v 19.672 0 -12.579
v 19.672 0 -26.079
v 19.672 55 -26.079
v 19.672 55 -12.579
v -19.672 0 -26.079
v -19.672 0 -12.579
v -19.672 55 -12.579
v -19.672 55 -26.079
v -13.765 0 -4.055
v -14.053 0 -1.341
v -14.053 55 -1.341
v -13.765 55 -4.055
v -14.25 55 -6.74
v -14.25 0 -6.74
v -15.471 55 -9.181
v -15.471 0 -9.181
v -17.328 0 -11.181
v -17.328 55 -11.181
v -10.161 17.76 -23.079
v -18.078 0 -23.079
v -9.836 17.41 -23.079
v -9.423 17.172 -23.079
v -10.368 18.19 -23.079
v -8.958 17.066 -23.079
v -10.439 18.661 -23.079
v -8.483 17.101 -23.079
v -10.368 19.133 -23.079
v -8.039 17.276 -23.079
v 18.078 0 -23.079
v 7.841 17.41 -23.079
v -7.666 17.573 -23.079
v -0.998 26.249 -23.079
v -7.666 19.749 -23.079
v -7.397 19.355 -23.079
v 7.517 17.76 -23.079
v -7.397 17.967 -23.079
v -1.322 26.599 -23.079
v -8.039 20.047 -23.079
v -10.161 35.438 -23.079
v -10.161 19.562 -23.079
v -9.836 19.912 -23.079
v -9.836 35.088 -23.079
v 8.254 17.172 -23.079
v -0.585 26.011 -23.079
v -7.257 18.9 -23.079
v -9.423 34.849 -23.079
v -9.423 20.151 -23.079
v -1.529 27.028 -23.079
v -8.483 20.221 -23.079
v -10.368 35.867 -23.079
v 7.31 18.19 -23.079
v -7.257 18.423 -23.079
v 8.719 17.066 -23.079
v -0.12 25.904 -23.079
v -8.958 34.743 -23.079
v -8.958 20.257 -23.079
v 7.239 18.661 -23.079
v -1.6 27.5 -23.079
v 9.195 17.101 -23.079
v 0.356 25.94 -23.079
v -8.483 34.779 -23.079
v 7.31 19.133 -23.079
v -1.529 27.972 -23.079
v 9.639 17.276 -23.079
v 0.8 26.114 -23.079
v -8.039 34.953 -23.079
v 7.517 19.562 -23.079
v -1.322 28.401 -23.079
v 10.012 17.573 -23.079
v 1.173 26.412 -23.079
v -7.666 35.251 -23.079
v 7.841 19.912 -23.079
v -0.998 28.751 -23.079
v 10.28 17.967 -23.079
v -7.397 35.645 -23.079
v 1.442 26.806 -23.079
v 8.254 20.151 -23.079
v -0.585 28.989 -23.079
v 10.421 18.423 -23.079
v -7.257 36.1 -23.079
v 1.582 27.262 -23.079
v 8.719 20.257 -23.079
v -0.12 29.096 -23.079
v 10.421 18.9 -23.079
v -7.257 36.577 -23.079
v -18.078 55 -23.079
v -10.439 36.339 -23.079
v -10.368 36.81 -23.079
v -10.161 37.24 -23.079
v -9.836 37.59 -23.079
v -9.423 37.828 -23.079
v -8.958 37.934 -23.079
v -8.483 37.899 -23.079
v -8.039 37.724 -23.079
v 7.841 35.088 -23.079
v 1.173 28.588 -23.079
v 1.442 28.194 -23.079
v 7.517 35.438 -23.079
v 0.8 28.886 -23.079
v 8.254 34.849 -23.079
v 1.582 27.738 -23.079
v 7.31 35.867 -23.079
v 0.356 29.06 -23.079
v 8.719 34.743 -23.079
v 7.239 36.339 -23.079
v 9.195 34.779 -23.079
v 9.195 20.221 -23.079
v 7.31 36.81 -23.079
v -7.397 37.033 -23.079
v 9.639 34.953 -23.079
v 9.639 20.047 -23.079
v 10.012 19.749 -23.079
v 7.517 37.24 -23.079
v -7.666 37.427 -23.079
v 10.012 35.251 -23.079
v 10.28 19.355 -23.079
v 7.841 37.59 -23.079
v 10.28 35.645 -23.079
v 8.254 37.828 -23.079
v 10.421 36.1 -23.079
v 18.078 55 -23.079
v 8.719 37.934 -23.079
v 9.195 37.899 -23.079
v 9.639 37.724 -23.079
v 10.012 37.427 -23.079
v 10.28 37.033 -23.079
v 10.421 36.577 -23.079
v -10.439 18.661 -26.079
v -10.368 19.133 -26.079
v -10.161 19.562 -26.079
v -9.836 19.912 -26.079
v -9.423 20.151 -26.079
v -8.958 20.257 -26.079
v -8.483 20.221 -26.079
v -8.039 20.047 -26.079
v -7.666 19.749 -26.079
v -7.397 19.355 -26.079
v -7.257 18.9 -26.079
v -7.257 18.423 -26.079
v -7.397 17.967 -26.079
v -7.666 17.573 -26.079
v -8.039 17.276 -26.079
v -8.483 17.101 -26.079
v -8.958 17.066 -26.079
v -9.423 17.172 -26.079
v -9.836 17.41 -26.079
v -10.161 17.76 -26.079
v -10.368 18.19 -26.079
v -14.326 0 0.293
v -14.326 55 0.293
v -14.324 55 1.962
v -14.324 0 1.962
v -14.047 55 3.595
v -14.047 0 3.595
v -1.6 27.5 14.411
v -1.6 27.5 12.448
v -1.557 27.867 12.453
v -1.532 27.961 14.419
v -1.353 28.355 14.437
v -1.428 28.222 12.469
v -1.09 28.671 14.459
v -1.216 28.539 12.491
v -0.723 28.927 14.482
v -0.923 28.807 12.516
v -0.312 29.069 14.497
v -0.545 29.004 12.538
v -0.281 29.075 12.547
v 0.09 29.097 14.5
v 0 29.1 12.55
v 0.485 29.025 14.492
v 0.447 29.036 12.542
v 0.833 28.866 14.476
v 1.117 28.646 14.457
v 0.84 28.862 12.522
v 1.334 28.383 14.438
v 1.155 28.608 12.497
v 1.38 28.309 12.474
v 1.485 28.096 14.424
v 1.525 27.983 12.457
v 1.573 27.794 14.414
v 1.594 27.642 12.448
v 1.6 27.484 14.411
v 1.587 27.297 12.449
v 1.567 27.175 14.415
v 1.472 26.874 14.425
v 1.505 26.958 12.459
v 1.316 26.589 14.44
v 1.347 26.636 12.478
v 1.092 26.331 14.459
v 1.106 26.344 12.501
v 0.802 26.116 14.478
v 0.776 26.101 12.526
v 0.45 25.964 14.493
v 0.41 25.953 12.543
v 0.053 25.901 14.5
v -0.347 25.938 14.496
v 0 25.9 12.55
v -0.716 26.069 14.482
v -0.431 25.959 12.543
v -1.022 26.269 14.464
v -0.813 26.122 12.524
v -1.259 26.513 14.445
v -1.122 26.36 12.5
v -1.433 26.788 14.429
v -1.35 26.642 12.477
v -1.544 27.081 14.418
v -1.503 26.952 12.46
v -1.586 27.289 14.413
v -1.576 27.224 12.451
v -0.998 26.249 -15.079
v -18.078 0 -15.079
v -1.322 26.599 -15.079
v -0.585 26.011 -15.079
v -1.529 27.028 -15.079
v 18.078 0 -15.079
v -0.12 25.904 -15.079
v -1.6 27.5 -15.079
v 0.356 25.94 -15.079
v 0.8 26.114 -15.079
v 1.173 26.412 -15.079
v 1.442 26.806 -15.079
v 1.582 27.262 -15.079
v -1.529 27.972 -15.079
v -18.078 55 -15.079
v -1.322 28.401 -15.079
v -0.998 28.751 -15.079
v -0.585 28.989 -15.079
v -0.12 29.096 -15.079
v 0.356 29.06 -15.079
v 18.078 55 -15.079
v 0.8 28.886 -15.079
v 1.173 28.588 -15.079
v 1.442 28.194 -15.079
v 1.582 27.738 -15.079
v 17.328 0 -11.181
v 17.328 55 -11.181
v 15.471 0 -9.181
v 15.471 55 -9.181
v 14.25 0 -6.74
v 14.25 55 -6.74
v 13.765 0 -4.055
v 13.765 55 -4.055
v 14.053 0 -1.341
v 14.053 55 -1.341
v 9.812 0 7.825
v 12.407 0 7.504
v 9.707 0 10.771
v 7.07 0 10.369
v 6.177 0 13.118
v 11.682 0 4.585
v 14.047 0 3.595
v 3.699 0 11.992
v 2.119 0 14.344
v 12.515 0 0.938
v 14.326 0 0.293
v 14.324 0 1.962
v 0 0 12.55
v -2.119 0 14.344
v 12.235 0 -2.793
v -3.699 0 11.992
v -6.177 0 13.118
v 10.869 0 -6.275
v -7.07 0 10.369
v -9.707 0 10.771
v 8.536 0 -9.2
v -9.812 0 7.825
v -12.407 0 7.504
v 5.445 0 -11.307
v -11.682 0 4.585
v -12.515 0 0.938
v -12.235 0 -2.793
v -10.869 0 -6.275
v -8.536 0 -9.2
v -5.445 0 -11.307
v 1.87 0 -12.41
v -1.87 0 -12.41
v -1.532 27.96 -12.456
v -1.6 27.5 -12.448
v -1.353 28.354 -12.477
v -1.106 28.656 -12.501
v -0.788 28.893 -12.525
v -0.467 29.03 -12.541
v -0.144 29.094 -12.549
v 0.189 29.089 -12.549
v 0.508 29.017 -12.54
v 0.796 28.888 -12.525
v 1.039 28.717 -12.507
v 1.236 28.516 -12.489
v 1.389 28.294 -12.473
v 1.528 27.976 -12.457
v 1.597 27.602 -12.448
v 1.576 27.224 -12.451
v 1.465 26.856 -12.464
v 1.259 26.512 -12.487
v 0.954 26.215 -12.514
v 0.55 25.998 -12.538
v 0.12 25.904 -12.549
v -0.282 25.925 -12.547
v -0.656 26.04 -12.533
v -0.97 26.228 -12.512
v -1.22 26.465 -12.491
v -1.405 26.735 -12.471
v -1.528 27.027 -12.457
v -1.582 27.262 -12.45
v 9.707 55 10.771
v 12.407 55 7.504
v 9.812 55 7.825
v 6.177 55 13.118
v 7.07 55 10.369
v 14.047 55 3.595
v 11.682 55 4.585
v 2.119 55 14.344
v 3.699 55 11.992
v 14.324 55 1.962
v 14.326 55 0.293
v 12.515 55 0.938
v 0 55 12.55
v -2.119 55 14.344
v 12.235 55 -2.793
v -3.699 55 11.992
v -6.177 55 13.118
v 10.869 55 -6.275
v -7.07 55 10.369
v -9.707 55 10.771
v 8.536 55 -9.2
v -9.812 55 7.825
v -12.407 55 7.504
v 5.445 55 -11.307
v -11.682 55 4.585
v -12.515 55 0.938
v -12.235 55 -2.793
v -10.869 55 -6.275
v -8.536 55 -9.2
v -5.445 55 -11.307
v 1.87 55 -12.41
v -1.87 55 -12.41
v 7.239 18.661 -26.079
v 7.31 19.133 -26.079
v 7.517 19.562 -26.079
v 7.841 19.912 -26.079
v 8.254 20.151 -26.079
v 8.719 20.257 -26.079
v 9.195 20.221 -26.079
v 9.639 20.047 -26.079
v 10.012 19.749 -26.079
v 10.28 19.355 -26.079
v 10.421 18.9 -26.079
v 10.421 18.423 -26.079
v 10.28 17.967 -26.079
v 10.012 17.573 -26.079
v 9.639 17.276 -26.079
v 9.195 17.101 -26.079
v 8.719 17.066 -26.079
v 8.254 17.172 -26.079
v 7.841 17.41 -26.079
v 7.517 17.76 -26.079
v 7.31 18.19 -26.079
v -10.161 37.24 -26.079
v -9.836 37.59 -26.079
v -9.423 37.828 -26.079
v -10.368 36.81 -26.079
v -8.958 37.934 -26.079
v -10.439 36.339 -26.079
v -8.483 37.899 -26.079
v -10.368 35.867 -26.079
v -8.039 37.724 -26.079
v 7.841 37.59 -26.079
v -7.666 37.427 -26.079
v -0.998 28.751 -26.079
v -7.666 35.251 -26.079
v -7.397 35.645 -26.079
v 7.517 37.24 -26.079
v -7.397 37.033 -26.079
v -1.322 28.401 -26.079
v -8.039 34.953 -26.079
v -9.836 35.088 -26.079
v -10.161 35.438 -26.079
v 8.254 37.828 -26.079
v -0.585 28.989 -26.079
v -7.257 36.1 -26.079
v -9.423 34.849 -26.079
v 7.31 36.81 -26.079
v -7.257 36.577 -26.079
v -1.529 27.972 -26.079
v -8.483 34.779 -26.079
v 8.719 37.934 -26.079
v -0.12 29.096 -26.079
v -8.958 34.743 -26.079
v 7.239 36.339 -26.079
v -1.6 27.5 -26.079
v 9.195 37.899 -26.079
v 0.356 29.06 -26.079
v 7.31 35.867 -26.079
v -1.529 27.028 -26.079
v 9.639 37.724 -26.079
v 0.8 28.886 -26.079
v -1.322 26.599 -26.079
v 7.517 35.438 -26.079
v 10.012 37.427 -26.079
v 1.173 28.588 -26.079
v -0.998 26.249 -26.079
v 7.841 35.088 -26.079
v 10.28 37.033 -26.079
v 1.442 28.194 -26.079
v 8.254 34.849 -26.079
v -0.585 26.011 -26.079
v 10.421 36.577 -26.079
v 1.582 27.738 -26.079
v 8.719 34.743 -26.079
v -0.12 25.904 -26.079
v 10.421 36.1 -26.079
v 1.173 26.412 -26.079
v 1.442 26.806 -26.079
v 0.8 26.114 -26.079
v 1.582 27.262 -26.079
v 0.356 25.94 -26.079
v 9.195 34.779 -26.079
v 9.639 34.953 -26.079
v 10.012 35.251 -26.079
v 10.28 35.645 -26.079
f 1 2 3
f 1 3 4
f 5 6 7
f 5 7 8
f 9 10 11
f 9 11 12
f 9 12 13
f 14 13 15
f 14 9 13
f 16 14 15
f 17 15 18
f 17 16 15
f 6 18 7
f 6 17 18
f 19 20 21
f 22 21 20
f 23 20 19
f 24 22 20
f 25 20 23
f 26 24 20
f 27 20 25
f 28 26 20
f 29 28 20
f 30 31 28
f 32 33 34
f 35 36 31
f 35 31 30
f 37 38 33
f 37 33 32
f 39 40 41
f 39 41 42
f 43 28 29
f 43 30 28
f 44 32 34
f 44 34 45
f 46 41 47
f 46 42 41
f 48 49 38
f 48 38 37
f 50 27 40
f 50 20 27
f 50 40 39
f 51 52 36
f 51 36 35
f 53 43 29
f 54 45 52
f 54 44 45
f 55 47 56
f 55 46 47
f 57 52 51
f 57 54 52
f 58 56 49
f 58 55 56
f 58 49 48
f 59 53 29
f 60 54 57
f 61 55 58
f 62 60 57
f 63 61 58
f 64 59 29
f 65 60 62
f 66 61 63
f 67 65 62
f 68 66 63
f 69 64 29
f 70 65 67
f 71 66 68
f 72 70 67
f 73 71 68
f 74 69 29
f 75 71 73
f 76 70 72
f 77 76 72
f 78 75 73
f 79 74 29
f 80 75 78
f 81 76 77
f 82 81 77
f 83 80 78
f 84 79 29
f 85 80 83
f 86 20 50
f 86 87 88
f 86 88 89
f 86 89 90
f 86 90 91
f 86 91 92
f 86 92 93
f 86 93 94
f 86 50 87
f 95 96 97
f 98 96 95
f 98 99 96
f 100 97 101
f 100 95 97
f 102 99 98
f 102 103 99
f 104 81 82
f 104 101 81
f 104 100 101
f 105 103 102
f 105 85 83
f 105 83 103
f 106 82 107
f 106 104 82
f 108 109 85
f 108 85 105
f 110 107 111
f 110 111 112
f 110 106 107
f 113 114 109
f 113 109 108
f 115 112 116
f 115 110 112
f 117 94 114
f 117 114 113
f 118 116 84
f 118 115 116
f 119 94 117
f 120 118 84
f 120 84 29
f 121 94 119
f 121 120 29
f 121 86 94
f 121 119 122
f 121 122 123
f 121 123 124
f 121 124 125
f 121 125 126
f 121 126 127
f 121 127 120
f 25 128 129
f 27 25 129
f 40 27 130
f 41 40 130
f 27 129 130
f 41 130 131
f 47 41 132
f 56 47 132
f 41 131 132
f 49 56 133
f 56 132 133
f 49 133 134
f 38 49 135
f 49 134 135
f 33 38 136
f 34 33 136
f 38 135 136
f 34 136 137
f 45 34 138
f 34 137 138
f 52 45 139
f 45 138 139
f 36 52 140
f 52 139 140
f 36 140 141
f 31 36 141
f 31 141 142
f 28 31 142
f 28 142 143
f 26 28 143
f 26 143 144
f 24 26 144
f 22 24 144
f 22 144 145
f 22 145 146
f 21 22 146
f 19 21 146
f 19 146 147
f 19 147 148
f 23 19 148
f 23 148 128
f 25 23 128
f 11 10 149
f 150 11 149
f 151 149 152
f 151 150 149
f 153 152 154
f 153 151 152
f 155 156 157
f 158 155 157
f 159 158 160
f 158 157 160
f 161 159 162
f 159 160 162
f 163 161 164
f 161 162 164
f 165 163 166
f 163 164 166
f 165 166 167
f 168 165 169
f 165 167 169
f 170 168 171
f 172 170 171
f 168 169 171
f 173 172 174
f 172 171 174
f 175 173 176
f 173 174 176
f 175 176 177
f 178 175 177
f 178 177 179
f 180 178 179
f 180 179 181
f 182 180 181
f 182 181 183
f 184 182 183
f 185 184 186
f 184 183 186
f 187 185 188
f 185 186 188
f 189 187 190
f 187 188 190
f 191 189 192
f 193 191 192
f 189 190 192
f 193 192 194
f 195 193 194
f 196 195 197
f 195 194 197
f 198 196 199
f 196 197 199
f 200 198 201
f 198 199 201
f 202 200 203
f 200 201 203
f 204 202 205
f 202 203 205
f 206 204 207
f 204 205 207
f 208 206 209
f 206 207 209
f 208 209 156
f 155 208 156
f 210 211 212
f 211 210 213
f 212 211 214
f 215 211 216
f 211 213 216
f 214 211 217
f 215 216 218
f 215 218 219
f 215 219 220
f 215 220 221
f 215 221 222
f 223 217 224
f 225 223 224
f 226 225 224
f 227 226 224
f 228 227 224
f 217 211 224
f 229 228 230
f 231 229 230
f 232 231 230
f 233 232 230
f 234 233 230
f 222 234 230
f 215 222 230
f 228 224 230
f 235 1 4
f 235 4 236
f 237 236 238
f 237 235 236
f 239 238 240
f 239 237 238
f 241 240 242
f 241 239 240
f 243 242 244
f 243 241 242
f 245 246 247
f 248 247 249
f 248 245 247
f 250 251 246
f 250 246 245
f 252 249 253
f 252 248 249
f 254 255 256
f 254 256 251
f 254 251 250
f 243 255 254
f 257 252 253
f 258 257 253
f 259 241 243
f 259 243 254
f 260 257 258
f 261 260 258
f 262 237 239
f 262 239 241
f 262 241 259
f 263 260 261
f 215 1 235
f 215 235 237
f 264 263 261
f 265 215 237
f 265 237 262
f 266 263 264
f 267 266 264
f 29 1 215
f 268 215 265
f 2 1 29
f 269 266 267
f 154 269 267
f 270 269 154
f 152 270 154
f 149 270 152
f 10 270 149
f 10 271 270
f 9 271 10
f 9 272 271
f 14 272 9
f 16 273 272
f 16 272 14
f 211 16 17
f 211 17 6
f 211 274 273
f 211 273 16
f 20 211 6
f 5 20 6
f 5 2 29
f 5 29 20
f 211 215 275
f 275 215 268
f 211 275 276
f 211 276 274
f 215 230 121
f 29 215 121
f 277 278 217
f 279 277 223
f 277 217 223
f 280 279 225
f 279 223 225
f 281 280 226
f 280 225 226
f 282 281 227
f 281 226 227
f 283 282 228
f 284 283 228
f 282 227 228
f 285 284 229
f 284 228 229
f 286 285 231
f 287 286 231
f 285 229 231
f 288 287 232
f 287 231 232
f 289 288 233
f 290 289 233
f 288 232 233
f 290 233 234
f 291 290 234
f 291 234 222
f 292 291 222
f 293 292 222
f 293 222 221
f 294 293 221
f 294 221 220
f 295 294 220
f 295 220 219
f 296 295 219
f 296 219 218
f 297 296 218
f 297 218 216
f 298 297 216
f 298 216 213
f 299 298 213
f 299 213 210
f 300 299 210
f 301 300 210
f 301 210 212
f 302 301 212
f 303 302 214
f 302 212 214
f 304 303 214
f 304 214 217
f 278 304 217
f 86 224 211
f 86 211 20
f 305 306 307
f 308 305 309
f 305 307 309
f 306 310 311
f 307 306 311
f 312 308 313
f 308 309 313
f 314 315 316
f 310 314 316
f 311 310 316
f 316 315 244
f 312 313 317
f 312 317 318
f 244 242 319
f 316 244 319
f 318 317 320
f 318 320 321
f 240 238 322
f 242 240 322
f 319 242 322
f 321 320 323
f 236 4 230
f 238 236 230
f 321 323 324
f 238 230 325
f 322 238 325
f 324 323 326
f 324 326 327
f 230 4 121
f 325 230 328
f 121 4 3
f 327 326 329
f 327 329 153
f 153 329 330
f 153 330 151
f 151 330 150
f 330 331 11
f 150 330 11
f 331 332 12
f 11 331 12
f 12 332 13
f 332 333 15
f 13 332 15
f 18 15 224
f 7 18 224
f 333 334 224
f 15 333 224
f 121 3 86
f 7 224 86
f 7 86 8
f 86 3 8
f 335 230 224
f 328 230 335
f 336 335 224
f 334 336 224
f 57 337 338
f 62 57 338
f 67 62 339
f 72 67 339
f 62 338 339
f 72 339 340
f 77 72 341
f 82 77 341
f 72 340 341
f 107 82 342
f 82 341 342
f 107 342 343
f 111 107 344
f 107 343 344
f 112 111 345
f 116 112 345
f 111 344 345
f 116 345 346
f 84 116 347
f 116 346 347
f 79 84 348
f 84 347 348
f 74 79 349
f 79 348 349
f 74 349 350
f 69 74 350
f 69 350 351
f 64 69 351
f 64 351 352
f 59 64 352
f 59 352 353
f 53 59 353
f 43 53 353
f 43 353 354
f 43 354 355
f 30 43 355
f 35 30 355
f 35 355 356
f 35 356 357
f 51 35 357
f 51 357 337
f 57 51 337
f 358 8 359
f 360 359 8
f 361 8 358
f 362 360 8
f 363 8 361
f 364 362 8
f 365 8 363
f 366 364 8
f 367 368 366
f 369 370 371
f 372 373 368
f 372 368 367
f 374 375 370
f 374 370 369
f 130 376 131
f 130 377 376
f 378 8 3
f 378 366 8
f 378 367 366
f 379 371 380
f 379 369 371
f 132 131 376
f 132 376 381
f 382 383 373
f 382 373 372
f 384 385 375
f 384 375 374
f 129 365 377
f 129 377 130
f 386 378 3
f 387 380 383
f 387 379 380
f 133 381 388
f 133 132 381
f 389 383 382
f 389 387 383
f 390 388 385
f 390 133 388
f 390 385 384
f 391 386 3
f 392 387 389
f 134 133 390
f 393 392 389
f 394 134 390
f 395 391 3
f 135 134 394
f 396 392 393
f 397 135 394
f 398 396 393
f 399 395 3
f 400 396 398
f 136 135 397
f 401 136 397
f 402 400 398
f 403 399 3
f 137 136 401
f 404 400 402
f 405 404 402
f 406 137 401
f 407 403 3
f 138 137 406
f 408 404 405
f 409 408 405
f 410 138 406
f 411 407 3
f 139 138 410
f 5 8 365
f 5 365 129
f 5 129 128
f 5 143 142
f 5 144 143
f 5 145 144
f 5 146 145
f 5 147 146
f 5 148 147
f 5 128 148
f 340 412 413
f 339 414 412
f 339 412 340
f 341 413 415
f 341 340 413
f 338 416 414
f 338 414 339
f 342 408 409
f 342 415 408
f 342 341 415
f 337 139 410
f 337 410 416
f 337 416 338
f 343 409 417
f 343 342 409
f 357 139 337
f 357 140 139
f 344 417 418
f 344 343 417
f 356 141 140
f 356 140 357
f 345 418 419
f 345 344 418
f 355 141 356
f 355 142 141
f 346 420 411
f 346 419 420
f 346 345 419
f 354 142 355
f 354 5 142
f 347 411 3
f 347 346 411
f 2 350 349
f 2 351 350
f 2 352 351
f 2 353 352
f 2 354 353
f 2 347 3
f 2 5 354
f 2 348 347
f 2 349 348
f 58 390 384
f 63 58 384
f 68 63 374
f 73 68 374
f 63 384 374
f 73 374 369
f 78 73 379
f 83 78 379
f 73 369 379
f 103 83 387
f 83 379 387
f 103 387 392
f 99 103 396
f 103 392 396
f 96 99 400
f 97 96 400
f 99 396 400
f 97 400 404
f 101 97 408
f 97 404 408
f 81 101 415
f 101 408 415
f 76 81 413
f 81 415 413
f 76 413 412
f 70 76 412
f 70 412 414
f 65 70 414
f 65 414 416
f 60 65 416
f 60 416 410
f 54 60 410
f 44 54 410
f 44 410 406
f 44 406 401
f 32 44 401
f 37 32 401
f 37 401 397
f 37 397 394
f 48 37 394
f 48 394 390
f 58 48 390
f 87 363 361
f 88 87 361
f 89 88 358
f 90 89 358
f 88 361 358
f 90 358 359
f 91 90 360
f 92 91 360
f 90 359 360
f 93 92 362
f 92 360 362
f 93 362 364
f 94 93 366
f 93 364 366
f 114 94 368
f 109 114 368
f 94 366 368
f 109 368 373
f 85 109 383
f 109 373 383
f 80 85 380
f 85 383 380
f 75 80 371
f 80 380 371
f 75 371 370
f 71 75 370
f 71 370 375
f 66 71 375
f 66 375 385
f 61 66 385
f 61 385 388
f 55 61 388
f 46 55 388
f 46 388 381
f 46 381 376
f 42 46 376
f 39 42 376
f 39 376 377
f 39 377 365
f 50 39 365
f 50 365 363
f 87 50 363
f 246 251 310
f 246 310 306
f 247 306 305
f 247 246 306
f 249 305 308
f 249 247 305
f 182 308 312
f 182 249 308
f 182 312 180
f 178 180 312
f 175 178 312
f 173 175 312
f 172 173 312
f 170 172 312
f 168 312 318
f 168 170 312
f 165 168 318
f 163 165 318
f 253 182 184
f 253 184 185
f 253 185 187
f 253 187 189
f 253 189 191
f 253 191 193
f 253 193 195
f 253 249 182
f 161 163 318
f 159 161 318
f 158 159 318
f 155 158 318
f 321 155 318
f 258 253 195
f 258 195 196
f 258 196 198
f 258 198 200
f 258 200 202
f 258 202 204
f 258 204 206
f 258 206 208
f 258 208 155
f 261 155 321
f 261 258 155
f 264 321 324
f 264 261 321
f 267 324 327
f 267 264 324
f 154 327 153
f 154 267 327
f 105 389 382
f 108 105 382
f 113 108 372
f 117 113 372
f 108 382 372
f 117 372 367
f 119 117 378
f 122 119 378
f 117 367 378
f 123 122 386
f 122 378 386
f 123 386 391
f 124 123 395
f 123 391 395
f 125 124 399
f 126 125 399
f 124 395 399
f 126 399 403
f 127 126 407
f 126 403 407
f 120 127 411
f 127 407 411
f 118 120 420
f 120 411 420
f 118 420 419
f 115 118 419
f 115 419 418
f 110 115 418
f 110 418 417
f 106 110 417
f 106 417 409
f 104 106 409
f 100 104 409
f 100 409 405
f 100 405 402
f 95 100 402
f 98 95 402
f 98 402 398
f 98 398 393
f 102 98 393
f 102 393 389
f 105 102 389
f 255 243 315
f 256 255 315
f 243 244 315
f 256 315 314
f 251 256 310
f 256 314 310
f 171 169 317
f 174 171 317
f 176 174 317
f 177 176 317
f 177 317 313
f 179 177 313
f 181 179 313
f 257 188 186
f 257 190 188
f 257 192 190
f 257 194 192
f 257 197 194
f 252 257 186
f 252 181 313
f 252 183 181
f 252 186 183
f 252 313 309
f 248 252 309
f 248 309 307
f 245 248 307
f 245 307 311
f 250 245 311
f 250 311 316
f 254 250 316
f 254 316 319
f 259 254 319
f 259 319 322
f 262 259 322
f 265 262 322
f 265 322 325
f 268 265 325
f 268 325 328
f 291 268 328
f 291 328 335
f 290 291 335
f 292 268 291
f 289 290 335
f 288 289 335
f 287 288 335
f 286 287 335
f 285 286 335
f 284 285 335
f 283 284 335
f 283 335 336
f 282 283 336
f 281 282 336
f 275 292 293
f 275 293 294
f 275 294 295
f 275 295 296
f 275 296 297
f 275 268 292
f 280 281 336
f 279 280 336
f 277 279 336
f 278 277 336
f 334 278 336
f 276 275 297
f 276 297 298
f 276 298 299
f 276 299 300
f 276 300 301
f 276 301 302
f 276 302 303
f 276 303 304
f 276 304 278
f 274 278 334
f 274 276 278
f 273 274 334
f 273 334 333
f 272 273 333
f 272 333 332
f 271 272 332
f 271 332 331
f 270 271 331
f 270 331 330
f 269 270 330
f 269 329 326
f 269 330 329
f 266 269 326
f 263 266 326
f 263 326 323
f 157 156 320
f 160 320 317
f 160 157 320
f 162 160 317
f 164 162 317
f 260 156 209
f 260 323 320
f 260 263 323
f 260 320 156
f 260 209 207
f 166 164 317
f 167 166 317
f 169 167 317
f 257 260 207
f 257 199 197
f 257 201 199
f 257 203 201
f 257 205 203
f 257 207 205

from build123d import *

# Parameters (mm, degrees)
BOSS_EXTRUDE2_DEPTH = 55
SKETCH7_R           = 12.55
CUT_EXTRUDE2_DEPTH  = 64.969298353
SKETCH8_R           = 1.6
CUT_EXTRUDE3_DEPTH  = 72.1238248
SKETCH10_R          = 1.6
CUT_EXTRUDE5_DEPTH  = 8
SKETCH11_W          = 36.155443868
SKETCH11_H          = 8
CUT_EXTRUDE6_DEPTH  = 64.96929848
FILLET1_R           = 10


with BuildPart() as part:
    # Sketch4 → Boss-Extrude2 (new body)
    with BuildSketch(Plane(origin=(0, 0, 0), x_dir=(1, 0, 0), z_dir=(0, 1, 0))):
        with BuildLine():
            Line((-19.671845121, 26.078528358), (19.671845121, 26.078528358))
            Line((19.671845121, 26.078528358), (19.671845121, 12.578528358))
            ThreePointArc((19.671845121, 12.578528358), (14.48082404, 7.360388375), (14.5, 0))
            ThreePointArc((14.5, 0), (0, -14.5), (-14.5, 0))
            ThreePointArc((-14.5, 0), (-14.48082404, 7.360388375), (-19.671845121, 12.578528358))
            Line((-19.671845121, 12.578528358), (-19.671845121, 26.078528358))
        make_face()
    extrude(amount=BOSS_EXTRUDE2_DEPTH)

    # Sketch7 → Cut-Extrude2 (cut, through all)
    with BuildSketch(Plane(origin=(0, 0, 0), x_dir=(1, 0, 0), z_dir=(0, 1, 0))):
        with Locations(Location((0, 0, 0), (0, 0, 270))):
            Circle(SKETCH7_R)
    extrude(amount=CUT_EXTRUDE2_DEPTH, mode=Mode.SUBTRACT)

    # Sketch8 → Cut-Extrude3 (cut, through all)
    with BuildSketch(Plane(origin=(0, 0, -26.078528358), x_dir=(-1, 0, 0), z_dir=(0, 0, -1))):
        with Locations((0, 27.5)):
            Circle(SKETCH8_R)
    extrude(amount=-CUT_EXTRUDE3_DEPTH, mode=Mode.SUBTRACT)

    # Sketch10 → Cut-Extrude5 (cut)
    with BuildSketch(Plane(origin=(0, 0, -26.078528358), x_dir=(-1, 0, 0), z_dir=(0, 0, -1))):
        with Locations((8.838834765, 18.661165235)):
            Circle(SKETCH10_R)
        with Locations((8.838834765, 36.338834765)):
            Circle(SKETCH10_R)
        with Locations((-8.838834765, 36.338834765)):
            Circle(SKETCH10_R)
        with Locations((-8.838834765, 18.661165235)):
            Circle(SKETCH10_R)
    extrude(amount=-CUT_EXTRUDE5_DEPTH, mode=Mode.SUBTRACT)

    # Sketch11 → Cut-Extrude6 (cut, through all)
    with BuildSketch(Plane(origin=(0, 55, 0), x_dir=(1, 0, 0), z_dir=(0, 1, 0))):
        with Locations((0, 19.078528358)):
            Rectangle(SKETCH11_W, SKETCH11_H)
    extrude(amount=-CUT_EXTRUDE6_DEPTH, mode=Mode.SUBTRACT)

    # Fillet1
    fillet1_edges = [part.edges().sort_by_distance(p)[0] for p in [
        (14.5, 27.5, 0),
        (-14.5, 27.5, 0),
    ]]
    fillet(fillet1_edges, radius=FILLET1_R)


solid = part.part
